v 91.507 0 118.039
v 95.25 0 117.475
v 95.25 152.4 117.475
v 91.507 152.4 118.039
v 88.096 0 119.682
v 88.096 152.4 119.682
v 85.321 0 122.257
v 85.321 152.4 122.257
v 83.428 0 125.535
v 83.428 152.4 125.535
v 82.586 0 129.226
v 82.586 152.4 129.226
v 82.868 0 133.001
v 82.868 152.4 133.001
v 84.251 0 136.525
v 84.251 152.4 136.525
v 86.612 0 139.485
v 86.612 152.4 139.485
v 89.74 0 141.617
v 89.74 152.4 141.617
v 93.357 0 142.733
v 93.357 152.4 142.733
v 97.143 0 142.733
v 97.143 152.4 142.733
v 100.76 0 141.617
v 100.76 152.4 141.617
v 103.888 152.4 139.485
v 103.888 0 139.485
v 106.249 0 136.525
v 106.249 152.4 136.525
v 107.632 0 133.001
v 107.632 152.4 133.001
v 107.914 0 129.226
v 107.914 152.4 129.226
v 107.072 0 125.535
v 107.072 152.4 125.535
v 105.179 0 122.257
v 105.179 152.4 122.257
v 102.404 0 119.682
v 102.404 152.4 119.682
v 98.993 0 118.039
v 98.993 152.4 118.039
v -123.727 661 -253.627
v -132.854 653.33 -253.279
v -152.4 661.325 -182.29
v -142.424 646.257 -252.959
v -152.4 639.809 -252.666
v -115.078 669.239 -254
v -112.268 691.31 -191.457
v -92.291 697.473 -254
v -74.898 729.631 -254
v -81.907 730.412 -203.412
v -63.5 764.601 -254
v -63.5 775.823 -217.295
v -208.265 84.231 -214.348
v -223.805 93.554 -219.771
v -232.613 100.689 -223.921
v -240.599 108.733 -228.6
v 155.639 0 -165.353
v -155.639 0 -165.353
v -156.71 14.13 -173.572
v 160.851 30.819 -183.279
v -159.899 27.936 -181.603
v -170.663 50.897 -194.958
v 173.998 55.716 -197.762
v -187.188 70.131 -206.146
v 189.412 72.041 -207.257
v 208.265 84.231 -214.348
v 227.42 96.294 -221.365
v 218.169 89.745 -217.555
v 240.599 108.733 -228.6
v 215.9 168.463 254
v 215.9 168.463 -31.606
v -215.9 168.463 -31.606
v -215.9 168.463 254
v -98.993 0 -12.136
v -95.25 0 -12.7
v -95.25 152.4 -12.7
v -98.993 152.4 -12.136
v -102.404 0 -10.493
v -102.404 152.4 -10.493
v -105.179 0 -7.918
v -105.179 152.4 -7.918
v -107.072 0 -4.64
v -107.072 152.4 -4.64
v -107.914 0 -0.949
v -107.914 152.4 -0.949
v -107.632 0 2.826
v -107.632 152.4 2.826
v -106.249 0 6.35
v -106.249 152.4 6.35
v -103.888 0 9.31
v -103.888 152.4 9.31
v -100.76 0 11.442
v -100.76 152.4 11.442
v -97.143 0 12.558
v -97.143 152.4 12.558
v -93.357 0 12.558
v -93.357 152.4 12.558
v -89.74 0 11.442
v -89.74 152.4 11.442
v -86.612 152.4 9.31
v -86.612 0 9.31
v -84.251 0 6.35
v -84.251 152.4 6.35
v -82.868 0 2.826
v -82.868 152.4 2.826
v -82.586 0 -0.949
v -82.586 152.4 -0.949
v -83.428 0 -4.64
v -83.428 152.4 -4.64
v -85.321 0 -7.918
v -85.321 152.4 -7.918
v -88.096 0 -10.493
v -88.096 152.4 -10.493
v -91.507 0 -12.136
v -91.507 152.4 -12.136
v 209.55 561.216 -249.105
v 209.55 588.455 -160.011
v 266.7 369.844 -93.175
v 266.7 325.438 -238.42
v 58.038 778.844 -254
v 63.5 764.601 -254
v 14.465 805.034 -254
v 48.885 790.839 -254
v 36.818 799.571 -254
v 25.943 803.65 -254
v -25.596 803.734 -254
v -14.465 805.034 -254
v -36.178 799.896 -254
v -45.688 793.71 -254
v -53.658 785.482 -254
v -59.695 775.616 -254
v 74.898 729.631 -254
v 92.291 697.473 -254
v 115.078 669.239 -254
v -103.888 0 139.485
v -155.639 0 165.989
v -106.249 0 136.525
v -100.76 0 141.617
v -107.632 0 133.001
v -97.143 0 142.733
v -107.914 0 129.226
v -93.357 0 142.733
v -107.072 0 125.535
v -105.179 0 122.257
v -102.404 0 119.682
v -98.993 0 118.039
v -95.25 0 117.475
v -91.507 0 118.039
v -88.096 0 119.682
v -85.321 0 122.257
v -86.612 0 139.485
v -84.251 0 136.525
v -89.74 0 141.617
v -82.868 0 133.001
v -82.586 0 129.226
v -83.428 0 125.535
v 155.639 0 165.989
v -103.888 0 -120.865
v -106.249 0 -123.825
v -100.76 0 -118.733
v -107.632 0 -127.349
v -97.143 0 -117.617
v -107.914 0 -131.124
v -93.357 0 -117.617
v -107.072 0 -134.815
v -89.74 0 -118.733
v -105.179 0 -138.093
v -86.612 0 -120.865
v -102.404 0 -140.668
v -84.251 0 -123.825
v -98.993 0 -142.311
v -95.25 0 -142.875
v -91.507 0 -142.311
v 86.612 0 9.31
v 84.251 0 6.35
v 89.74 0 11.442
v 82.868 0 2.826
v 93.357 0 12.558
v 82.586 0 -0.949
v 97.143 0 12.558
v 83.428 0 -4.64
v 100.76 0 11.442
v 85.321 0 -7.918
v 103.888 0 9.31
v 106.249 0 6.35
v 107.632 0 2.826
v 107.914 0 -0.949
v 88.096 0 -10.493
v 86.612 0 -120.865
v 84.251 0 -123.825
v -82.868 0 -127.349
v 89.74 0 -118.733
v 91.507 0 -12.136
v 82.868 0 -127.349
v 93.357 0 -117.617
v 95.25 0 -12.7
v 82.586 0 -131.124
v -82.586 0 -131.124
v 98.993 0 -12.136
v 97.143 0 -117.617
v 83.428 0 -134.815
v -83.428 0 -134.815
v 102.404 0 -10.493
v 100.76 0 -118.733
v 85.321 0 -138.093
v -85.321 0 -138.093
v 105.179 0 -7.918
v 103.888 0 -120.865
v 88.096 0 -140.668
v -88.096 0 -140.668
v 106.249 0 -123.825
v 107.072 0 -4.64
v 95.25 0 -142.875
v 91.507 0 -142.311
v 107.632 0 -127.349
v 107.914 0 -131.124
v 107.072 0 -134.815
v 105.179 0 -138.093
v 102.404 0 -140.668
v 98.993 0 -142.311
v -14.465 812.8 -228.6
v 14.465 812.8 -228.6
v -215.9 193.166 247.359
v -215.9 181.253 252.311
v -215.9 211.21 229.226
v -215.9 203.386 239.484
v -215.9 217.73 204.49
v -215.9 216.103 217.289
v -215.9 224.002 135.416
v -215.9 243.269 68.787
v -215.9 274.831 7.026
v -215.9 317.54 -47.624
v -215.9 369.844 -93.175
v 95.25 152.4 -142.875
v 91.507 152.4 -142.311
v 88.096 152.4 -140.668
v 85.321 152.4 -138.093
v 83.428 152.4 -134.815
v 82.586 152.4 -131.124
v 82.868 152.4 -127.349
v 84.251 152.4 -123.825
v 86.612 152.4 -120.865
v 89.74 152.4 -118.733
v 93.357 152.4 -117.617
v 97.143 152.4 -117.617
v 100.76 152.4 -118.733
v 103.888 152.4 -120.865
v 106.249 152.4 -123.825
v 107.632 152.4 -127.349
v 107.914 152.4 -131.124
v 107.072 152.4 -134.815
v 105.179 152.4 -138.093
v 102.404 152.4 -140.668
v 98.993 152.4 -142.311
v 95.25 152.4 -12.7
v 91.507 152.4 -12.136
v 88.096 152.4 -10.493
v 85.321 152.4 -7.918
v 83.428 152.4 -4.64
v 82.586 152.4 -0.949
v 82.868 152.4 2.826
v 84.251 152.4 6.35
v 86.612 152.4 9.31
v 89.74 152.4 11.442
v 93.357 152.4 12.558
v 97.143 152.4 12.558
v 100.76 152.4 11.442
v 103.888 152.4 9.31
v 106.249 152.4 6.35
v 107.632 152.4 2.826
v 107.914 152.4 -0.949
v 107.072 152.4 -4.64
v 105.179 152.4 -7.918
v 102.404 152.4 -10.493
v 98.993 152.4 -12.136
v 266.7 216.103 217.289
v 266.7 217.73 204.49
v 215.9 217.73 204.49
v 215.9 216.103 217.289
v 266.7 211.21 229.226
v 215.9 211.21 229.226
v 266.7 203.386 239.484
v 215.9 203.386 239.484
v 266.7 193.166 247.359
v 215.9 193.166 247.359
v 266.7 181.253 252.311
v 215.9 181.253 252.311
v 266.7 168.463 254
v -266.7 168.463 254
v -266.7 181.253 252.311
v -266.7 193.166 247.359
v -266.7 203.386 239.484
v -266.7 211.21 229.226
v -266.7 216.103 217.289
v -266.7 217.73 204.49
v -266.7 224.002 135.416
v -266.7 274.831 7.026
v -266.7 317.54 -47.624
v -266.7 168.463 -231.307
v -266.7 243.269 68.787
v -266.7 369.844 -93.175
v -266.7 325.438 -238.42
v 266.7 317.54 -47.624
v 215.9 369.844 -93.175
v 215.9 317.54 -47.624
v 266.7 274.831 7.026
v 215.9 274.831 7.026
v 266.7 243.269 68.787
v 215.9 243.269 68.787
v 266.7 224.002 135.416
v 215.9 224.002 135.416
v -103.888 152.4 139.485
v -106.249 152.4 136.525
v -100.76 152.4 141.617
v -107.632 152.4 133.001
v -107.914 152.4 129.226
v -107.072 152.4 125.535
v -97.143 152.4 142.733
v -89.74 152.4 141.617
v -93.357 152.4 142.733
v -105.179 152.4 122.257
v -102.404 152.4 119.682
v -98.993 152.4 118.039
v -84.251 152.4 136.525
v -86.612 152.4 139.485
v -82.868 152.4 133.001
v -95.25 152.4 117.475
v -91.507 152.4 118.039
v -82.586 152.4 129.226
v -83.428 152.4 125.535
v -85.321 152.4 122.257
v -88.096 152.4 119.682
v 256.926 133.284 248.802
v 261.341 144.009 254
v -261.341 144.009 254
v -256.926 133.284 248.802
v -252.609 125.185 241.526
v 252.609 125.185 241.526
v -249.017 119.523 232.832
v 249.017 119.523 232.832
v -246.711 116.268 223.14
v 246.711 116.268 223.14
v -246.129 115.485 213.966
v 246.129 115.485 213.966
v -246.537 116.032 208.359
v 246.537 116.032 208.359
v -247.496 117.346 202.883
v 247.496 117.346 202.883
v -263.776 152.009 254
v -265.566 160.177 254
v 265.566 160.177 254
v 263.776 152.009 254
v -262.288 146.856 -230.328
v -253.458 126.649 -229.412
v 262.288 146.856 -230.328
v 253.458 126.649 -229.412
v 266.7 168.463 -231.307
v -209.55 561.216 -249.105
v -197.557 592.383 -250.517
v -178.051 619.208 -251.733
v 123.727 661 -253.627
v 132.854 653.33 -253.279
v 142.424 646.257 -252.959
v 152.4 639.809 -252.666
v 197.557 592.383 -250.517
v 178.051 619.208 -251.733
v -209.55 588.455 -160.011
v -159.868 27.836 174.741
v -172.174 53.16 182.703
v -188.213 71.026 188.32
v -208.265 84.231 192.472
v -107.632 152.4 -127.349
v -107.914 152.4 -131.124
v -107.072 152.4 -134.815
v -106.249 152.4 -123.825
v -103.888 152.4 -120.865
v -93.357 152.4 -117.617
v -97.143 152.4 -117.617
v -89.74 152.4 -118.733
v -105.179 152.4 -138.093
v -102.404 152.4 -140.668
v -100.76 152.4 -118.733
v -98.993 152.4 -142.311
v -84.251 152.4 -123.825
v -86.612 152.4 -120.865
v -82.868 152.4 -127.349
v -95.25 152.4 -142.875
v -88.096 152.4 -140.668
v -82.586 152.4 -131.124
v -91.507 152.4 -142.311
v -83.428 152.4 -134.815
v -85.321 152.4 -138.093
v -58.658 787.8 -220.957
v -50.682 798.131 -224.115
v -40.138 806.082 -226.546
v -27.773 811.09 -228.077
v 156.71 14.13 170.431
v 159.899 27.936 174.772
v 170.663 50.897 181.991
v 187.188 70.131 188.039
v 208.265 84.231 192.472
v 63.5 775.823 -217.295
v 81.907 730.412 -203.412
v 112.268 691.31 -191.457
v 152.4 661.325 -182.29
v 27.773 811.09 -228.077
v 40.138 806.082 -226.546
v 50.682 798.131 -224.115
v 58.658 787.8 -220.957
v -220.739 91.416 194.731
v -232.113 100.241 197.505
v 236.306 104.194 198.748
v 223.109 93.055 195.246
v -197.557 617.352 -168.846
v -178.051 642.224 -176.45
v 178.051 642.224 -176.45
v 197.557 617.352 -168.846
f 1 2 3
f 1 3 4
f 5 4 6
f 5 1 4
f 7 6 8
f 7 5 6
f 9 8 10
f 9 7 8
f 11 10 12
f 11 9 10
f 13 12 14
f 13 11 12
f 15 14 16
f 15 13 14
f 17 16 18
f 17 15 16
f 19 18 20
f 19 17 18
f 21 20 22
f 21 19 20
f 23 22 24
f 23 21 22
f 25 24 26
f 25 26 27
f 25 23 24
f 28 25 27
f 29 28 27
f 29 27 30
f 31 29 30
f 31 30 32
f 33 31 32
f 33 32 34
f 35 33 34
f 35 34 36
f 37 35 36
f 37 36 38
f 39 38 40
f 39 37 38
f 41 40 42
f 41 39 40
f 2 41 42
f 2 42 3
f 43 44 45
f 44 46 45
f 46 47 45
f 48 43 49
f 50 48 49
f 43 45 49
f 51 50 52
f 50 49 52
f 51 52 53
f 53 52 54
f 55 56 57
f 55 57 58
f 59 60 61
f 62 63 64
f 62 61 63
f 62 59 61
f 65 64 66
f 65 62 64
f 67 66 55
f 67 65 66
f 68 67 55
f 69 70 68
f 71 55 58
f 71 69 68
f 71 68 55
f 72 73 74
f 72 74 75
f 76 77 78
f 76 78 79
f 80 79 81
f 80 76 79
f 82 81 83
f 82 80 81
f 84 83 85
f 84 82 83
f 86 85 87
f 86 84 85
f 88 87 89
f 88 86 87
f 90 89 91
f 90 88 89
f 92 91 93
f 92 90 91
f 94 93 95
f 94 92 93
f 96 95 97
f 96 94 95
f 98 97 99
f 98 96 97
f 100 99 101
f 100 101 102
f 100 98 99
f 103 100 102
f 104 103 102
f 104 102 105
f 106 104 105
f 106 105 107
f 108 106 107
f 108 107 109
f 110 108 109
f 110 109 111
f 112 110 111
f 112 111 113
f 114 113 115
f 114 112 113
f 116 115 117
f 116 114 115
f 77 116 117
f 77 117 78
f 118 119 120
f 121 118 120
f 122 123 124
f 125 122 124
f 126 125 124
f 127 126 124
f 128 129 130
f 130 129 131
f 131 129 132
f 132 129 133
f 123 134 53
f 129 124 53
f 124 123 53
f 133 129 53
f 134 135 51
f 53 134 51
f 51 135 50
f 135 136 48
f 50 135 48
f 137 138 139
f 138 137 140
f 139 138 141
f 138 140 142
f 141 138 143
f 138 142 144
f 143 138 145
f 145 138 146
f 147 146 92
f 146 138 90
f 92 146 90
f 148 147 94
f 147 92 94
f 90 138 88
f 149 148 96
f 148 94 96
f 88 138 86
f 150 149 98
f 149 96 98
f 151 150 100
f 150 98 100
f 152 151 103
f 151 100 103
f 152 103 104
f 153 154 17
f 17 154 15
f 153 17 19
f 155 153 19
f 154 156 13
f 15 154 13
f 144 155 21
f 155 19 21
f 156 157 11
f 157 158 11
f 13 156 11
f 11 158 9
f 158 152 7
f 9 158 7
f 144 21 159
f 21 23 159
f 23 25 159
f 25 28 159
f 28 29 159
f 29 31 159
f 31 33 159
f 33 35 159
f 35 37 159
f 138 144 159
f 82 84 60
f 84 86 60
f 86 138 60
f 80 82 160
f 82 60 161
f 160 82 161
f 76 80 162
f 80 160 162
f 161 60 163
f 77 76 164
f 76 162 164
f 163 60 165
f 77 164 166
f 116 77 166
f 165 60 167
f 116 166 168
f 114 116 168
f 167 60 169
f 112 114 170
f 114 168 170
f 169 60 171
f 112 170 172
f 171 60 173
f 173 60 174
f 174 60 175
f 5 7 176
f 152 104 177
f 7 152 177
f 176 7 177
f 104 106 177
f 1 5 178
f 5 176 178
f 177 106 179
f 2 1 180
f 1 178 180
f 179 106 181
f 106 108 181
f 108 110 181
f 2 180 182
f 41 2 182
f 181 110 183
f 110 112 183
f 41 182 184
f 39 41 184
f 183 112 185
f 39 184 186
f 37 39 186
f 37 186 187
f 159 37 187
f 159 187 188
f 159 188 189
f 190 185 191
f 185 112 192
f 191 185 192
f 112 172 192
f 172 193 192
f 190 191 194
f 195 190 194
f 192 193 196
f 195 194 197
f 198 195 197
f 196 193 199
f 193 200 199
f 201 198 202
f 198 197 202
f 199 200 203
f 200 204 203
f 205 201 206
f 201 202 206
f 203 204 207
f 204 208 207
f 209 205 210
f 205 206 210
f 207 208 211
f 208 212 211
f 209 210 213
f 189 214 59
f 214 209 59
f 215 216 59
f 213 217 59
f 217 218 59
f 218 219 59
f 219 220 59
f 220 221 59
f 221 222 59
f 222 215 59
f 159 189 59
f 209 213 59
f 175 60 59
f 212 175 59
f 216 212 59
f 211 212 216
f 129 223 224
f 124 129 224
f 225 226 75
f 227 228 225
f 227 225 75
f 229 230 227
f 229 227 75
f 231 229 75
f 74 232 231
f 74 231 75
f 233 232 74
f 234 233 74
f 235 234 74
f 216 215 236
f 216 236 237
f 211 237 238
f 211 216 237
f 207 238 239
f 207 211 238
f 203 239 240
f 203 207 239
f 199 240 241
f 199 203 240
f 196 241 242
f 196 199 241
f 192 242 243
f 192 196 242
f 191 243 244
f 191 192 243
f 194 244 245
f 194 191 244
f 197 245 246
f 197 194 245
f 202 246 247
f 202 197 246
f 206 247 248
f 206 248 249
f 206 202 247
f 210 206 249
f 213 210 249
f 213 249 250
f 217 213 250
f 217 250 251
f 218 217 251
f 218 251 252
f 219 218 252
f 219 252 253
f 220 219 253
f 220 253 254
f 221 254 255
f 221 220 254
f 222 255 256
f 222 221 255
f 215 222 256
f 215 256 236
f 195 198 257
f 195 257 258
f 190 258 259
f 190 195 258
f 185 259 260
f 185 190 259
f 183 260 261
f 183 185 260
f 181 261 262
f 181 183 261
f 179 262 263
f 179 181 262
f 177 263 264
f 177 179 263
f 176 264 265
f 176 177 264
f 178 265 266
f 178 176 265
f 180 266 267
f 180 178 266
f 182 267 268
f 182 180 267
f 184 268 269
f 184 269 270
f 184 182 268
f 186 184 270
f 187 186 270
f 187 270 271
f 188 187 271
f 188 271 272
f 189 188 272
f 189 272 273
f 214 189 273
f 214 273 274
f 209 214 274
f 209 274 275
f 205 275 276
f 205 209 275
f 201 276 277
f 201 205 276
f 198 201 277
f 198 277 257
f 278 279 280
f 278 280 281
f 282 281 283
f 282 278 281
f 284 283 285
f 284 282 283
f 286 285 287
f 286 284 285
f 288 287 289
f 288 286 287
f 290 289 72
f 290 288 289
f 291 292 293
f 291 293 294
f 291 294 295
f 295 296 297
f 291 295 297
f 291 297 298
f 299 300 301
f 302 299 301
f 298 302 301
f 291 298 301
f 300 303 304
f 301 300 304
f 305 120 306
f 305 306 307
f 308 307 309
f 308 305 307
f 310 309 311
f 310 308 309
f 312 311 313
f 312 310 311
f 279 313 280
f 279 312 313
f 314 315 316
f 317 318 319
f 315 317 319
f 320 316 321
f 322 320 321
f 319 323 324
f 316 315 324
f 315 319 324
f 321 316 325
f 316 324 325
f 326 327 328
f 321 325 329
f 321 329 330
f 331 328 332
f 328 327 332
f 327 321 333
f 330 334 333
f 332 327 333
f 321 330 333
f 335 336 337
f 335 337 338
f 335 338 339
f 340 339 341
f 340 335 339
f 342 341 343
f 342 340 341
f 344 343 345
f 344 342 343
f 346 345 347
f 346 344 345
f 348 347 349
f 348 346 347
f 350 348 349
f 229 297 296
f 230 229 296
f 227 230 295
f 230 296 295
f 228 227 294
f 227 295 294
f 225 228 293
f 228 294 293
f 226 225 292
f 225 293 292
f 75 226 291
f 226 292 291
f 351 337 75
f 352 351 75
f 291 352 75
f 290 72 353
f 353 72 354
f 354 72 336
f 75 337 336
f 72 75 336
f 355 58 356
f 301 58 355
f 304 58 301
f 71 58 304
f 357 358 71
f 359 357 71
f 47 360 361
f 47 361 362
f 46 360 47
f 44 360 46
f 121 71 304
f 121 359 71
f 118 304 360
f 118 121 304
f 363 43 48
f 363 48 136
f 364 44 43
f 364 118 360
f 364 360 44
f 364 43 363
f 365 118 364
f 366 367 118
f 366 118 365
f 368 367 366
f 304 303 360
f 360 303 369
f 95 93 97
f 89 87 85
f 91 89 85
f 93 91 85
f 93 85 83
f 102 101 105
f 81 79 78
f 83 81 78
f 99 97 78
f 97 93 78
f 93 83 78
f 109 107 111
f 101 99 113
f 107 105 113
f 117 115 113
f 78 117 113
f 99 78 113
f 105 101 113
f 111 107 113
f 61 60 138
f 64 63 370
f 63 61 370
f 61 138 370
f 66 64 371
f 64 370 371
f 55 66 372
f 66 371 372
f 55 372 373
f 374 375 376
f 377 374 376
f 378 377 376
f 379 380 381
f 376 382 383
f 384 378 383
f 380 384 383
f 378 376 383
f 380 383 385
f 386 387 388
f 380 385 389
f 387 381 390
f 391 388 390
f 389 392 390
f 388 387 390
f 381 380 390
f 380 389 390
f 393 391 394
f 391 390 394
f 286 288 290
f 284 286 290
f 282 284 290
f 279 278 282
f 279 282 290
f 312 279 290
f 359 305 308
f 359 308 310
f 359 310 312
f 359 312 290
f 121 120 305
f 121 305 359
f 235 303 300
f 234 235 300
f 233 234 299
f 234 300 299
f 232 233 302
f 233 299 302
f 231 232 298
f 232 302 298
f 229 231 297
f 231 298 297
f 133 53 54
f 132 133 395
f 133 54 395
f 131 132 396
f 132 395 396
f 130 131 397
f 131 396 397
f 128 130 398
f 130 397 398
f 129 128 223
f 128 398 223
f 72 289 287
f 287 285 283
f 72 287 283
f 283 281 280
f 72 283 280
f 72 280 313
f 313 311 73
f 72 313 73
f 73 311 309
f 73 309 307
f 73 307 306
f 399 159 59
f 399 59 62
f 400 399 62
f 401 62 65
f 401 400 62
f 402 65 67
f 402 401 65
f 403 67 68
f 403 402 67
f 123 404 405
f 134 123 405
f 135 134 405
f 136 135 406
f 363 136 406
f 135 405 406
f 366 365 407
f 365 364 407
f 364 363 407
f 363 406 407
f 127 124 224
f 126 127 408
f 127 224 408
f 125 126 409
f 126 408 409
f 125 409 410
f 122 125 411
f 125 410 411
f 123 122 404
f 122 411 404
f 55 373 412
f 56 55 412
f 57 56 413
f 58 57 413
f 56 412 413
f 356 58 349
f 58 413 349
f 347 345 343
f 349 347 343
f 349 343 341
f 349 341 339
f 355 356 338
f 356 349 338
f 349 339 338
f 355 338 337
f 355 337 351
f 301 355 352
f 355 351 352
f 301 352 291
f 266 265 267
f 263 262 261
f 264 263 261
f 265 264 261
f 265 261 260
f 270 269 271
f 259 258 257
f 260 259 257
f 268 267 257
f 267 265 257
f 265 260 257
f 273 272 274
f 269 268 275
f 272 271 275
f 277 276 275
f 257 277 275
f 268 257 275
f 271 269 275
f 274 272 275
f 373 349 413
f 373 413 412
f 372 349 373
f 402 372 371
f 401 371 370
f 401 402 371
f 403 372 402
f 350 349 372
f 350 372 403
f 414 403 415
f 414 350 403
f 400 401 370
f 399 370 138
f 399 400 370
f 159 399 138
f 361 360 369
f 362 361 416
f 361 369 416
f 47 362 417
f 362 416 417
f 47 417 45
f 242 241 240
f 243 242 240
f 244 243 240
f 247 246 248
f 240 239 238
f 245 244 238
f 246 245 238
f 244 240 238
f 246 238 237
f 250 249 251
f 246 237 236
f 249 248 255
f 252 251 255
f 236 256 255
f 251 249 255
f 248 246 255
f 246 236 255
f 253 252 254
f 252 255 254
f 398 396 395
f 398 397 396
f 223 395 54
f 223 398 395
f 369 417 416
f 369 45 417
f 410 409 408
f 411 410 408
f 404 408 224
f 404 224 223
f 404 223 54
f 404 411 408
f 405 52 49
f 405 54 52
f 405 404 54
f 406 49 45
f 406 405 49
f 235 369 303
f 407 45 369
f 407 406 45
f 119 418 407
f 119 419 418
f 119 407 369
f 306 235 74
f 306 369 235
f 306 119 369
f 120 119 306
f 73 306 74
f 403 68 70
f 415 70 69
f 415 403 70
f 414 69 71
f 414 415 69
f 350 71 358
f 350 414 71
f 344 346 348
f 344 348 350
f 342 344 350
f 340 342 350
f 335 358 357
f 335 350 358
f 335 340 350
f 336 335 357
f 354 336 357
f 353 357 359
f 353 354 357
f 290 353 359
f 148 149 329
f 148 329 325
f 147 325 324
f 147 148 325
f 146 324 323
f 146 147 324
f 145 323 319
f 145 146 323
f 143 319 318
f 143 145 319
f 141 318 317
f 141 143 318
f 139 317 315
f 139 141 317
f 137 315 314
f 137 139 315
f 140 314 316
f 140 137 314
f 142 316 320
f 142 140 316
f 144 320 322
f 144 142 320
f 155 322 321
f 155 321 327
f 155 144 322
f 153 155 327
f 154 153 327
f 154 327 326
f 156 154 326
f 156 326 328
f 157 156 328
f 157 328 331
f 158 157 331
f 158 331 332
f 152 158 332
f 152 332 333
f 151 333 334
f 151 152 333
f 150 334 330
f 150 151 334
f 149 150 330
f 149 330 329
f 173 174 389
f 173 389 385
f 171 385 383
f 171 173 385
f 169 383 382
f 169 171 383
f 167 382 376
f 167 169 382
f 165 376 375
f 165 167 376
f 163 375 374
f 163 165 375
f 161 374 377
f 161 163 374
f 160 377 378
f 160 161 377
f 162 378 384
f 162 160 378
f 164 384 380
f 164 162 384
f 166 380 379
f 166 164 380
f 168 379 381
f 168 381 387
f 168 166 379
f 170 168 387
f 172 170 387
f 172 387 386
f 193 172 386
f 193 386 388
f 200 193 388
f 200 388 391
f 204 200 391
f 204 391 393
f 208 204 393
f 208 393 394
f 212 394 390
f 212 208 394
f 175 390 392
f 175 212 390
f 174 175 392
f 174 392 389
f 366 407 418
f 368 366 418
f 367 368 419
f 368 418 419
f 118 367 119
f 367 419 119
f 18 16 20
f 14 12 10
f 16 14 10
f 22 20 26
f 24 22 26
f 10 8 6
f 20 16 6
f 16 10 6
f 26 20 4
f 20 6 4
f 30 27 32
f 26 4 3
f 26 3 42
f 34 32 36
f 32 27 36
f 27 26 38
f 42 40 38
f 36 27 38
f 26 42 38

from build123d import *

# Parameters (mm, degrees)
SKETCH1_W           = 533.4
SKETCH1_H           = 508
SKETCH1_R           = 12.7
BOSS_EXTRUDE1_DEPTH = 152.4
BOSS_EXTRUDE2_DEPTH = 660.4
SKETCH4_OUTSIDE_W   = 729.384
SKETCH4_OUTSIDE_H   = 1034.184
CUT_EXTRUDE1_DEPTH  = 660.4
BOSS_EXTRUDE3_DEPTH = 50.8
SKETCH7_OUTSIDE_W   = 754.784
SKETCH7_OUTSIDE_H   = 1147.193
CUT_EXTRUDE2_DEPTH  = 254
CUT_EXTRUDE3_DEPTH  = 508


with BuildPart() as part:
    # Sketch1 → Boss-Extrude1 (new body)
    with BuildSketch(Plane(origin=(0, 0, 0), x_dir=(1, 0, 0), z_dir=(0, 1, 0))):
        Rectangle(SKETCH1_W, SKETCH1_H)
        with Locations((-95.25, -130.175)):
            Circle(SKETCH1_R, mode=Mode.SUBTRACT)
        with Locations((-95.25, 0)):
            Circle(SKETCH1_R, mode=Mode.SUBTRACT)
        with Locations((-95.25, 130.175)):
            Circle(SKETCH1_R, mode=Mode.SUBTRACT)
        with Locations((95.25, -130.175)):
            Circle(SKETCH1_R, mode=Mode.SUBTRACT)
        with Locations((95.25, 0)):
            Circle(SKETCH1_R, mode=Mode.SUBTRACT)
        with Locations((95.25, 130.175)):
            Circle(SKETCH1_R, mode=Mode.SUBTRACT)
    extrude(amount=BOSS_EXTRUDE1_DEPTH)

    # Sketch3 → Boss-Extrude2 (add)
    with BuildSketch(Plane(origin=(0, 152.4, 0), x_dir=(1, 0, 0), z_dir=(0, 1, 0))):
        Polygon((-266.7, 254), (-266.7, -254), (-165.1, -254), (165.1, -254), (266.7, -254), (266.7, 254), align=None)
    extrude(amount=BOSS_EXTRUDE2_DEPTH)

    # Sketch4 outside → Cut-Extrude1 (cut)
    with BuildSketch(Plane(origin=(266.7, 0, 0), x_dir=(0, 0, -1), z_dir=(1, 0, 0))):
        with Locations((0, 406.4)):
            Rectangle(SKETCH4_OUTSIDE_W, SKETCH4_OUTSIDE_H)
        with BuildLine():
            Line((228.6, 108.732858548), (254, 669.23901778))
            Line((254, 669.23901778), (254, 812.8))
            Line((254, 812.8), (228.6, 812.8))
            Line((228.6, 812.8), (31.606344145, 168.462784922))
            Line((31.606344145, 168.462784922), (-254, 168.462784922))
            ThreePointArc((-254, 168.462784922), (-243.936587472, 127.409322416), (-202.883124967, 117.345909888))
            Line((-202.883124967, 117.345909888), (-165.988990497, 0))
            Line((-165.988990497, 0), (165.353024922, 0))
            Line((165.353024922, 0), (228.6, 108.732858548))
        make_face(mode=Mode.SUBTRACT)
    extrude(amount=-CUT_EXTRUDE1_DEPTH, mode=Mode.SUBTRACT)

    # Sketch6 → Boss-Extrude3 (add)
    with BuildSketch(Plane.ZY.offset(266.7)):
        with BuildLine():
            Line((254, 168.462784922), (-31.606344145, 168.462784922))
            Line((-31.606344145, 168.462784922), (-93.174683572, 369.843749152))
            ThreePointArc((-93.174683572, 369.843749152), (37.15276036, 257.574854495), (204.490495991, 217.72978475))
            ThreePointArc((204.490495991, 217.72978475), (239.484222443, 203.385658011), (254, 168.462784922))
        make_face()
    boss_extrude3 = extrude(amount=-BOSS_EXTRUDE3_DEPTH)

    # Mirror1: Boss-Extrude3 across plane
    add(boss_extrude3.mirror(Plane.ZY))

    # Sketch7 outside → Cut-Extrude2 (cut)
    with BuildSketch(Plane(origin=(0, 5.563381647, 18.197001427), x_dir=(1, 0, 0), z_dir=(0, 0.29237170472274066, 0.9563047559630343))):
        with Locations((0, 388.6425)):
            Rectangle(SKETCH7_OUTSIDE_W, SKETCH7_OUTSIDE_H)
        with BuildLine():
            Line((-266.7, 380.92497735), (-209.55, 609.52497735))
            ThreePointArc((-209.55, 609.52497735), (-188.66895271, 653.395441882), (-152.4, 685.72497735))
            ThreePointArc((-152.4, 685.72497735), (-95.710918301, 736.501940936), (-63.5, 805.454161765))
            ThreePointArc((-63.5, 805.454161765), (-45.688148209, 833.291148022), (-14.465061194, 844.120677346))
            Line((-14.465061194, 844.120677346), (14.465061194, 844.120677346))
            ThreePointArc((14.465061194, 844.120677346), (45.688148209, 833.291148022), (63.5, 805.454161765))
            ThreePointArc((63.5, 805.454161765), (95.710918301, 736.501940936), (152.4, 685.72497735))
            ThreePointArc((152.4, 685.72497735), (188.66895271, 653.395441882), (209.55, 609.52497735))
            Line((209.55, 609.52497735), (266.7, 380.92497735))
            Line((266.7, 380.92497735), (266.7, -48.530484117))
            Line((266.7, -48.530484117), (-266.7, -48.530484117))
            Line((-266.7, -48.530484117), (-266.7, 380.92497735))
        make_face(mode=Mode.SUBTRACT)
    extrude(amount=-CUT_EXTRUDE2_DEPTH, mode=Mode.SUBTRACT)

    # Sketch10 → Cut-Extrude3 (cut)
    with BuildSketch(Plane.XY.offset(254)):
        with BuildLine():
            Line((-266.7, 168.462784922), (-387.417771375, 168.462784922))
            Line((-387.417771375, 168.462784922), (-387.417771375, 0))
            Line((-387.417771375, 0), (-155.638931275, 0))
            ThreePointArc((-155.638931275, 0), (-169.876966254, 49.659931769), (-208.265044728, 84.231392461))
            ThreePointArc((-208.265044728, 84.231392461), (-248.469302502, 118.725084742), (-266.7, 168.462784922))
        make_face()
        with BuildLine():
            Line((387.417771375, 0), (155.638931275, 0))
            ThreePointArc((155.638931275, 0), (169.876966254, 49.659931769), (208.265044728, 84.231392461))
            ThreePointArc((208.265044728, 84.231392461), (248.469302502, 118.725084742), (266.7, 168.462784922))
            Line((266.7, 168.462784922), (387.417771375, 168.462784922))
            Line((387.417771375, 168.462784922), (387.417771375, 0))
        make_face()
    extrude(amount=-CUT_EXTRUDE3_DEPTH, mode=Mode.SUBTRACT)


solid = part.part
